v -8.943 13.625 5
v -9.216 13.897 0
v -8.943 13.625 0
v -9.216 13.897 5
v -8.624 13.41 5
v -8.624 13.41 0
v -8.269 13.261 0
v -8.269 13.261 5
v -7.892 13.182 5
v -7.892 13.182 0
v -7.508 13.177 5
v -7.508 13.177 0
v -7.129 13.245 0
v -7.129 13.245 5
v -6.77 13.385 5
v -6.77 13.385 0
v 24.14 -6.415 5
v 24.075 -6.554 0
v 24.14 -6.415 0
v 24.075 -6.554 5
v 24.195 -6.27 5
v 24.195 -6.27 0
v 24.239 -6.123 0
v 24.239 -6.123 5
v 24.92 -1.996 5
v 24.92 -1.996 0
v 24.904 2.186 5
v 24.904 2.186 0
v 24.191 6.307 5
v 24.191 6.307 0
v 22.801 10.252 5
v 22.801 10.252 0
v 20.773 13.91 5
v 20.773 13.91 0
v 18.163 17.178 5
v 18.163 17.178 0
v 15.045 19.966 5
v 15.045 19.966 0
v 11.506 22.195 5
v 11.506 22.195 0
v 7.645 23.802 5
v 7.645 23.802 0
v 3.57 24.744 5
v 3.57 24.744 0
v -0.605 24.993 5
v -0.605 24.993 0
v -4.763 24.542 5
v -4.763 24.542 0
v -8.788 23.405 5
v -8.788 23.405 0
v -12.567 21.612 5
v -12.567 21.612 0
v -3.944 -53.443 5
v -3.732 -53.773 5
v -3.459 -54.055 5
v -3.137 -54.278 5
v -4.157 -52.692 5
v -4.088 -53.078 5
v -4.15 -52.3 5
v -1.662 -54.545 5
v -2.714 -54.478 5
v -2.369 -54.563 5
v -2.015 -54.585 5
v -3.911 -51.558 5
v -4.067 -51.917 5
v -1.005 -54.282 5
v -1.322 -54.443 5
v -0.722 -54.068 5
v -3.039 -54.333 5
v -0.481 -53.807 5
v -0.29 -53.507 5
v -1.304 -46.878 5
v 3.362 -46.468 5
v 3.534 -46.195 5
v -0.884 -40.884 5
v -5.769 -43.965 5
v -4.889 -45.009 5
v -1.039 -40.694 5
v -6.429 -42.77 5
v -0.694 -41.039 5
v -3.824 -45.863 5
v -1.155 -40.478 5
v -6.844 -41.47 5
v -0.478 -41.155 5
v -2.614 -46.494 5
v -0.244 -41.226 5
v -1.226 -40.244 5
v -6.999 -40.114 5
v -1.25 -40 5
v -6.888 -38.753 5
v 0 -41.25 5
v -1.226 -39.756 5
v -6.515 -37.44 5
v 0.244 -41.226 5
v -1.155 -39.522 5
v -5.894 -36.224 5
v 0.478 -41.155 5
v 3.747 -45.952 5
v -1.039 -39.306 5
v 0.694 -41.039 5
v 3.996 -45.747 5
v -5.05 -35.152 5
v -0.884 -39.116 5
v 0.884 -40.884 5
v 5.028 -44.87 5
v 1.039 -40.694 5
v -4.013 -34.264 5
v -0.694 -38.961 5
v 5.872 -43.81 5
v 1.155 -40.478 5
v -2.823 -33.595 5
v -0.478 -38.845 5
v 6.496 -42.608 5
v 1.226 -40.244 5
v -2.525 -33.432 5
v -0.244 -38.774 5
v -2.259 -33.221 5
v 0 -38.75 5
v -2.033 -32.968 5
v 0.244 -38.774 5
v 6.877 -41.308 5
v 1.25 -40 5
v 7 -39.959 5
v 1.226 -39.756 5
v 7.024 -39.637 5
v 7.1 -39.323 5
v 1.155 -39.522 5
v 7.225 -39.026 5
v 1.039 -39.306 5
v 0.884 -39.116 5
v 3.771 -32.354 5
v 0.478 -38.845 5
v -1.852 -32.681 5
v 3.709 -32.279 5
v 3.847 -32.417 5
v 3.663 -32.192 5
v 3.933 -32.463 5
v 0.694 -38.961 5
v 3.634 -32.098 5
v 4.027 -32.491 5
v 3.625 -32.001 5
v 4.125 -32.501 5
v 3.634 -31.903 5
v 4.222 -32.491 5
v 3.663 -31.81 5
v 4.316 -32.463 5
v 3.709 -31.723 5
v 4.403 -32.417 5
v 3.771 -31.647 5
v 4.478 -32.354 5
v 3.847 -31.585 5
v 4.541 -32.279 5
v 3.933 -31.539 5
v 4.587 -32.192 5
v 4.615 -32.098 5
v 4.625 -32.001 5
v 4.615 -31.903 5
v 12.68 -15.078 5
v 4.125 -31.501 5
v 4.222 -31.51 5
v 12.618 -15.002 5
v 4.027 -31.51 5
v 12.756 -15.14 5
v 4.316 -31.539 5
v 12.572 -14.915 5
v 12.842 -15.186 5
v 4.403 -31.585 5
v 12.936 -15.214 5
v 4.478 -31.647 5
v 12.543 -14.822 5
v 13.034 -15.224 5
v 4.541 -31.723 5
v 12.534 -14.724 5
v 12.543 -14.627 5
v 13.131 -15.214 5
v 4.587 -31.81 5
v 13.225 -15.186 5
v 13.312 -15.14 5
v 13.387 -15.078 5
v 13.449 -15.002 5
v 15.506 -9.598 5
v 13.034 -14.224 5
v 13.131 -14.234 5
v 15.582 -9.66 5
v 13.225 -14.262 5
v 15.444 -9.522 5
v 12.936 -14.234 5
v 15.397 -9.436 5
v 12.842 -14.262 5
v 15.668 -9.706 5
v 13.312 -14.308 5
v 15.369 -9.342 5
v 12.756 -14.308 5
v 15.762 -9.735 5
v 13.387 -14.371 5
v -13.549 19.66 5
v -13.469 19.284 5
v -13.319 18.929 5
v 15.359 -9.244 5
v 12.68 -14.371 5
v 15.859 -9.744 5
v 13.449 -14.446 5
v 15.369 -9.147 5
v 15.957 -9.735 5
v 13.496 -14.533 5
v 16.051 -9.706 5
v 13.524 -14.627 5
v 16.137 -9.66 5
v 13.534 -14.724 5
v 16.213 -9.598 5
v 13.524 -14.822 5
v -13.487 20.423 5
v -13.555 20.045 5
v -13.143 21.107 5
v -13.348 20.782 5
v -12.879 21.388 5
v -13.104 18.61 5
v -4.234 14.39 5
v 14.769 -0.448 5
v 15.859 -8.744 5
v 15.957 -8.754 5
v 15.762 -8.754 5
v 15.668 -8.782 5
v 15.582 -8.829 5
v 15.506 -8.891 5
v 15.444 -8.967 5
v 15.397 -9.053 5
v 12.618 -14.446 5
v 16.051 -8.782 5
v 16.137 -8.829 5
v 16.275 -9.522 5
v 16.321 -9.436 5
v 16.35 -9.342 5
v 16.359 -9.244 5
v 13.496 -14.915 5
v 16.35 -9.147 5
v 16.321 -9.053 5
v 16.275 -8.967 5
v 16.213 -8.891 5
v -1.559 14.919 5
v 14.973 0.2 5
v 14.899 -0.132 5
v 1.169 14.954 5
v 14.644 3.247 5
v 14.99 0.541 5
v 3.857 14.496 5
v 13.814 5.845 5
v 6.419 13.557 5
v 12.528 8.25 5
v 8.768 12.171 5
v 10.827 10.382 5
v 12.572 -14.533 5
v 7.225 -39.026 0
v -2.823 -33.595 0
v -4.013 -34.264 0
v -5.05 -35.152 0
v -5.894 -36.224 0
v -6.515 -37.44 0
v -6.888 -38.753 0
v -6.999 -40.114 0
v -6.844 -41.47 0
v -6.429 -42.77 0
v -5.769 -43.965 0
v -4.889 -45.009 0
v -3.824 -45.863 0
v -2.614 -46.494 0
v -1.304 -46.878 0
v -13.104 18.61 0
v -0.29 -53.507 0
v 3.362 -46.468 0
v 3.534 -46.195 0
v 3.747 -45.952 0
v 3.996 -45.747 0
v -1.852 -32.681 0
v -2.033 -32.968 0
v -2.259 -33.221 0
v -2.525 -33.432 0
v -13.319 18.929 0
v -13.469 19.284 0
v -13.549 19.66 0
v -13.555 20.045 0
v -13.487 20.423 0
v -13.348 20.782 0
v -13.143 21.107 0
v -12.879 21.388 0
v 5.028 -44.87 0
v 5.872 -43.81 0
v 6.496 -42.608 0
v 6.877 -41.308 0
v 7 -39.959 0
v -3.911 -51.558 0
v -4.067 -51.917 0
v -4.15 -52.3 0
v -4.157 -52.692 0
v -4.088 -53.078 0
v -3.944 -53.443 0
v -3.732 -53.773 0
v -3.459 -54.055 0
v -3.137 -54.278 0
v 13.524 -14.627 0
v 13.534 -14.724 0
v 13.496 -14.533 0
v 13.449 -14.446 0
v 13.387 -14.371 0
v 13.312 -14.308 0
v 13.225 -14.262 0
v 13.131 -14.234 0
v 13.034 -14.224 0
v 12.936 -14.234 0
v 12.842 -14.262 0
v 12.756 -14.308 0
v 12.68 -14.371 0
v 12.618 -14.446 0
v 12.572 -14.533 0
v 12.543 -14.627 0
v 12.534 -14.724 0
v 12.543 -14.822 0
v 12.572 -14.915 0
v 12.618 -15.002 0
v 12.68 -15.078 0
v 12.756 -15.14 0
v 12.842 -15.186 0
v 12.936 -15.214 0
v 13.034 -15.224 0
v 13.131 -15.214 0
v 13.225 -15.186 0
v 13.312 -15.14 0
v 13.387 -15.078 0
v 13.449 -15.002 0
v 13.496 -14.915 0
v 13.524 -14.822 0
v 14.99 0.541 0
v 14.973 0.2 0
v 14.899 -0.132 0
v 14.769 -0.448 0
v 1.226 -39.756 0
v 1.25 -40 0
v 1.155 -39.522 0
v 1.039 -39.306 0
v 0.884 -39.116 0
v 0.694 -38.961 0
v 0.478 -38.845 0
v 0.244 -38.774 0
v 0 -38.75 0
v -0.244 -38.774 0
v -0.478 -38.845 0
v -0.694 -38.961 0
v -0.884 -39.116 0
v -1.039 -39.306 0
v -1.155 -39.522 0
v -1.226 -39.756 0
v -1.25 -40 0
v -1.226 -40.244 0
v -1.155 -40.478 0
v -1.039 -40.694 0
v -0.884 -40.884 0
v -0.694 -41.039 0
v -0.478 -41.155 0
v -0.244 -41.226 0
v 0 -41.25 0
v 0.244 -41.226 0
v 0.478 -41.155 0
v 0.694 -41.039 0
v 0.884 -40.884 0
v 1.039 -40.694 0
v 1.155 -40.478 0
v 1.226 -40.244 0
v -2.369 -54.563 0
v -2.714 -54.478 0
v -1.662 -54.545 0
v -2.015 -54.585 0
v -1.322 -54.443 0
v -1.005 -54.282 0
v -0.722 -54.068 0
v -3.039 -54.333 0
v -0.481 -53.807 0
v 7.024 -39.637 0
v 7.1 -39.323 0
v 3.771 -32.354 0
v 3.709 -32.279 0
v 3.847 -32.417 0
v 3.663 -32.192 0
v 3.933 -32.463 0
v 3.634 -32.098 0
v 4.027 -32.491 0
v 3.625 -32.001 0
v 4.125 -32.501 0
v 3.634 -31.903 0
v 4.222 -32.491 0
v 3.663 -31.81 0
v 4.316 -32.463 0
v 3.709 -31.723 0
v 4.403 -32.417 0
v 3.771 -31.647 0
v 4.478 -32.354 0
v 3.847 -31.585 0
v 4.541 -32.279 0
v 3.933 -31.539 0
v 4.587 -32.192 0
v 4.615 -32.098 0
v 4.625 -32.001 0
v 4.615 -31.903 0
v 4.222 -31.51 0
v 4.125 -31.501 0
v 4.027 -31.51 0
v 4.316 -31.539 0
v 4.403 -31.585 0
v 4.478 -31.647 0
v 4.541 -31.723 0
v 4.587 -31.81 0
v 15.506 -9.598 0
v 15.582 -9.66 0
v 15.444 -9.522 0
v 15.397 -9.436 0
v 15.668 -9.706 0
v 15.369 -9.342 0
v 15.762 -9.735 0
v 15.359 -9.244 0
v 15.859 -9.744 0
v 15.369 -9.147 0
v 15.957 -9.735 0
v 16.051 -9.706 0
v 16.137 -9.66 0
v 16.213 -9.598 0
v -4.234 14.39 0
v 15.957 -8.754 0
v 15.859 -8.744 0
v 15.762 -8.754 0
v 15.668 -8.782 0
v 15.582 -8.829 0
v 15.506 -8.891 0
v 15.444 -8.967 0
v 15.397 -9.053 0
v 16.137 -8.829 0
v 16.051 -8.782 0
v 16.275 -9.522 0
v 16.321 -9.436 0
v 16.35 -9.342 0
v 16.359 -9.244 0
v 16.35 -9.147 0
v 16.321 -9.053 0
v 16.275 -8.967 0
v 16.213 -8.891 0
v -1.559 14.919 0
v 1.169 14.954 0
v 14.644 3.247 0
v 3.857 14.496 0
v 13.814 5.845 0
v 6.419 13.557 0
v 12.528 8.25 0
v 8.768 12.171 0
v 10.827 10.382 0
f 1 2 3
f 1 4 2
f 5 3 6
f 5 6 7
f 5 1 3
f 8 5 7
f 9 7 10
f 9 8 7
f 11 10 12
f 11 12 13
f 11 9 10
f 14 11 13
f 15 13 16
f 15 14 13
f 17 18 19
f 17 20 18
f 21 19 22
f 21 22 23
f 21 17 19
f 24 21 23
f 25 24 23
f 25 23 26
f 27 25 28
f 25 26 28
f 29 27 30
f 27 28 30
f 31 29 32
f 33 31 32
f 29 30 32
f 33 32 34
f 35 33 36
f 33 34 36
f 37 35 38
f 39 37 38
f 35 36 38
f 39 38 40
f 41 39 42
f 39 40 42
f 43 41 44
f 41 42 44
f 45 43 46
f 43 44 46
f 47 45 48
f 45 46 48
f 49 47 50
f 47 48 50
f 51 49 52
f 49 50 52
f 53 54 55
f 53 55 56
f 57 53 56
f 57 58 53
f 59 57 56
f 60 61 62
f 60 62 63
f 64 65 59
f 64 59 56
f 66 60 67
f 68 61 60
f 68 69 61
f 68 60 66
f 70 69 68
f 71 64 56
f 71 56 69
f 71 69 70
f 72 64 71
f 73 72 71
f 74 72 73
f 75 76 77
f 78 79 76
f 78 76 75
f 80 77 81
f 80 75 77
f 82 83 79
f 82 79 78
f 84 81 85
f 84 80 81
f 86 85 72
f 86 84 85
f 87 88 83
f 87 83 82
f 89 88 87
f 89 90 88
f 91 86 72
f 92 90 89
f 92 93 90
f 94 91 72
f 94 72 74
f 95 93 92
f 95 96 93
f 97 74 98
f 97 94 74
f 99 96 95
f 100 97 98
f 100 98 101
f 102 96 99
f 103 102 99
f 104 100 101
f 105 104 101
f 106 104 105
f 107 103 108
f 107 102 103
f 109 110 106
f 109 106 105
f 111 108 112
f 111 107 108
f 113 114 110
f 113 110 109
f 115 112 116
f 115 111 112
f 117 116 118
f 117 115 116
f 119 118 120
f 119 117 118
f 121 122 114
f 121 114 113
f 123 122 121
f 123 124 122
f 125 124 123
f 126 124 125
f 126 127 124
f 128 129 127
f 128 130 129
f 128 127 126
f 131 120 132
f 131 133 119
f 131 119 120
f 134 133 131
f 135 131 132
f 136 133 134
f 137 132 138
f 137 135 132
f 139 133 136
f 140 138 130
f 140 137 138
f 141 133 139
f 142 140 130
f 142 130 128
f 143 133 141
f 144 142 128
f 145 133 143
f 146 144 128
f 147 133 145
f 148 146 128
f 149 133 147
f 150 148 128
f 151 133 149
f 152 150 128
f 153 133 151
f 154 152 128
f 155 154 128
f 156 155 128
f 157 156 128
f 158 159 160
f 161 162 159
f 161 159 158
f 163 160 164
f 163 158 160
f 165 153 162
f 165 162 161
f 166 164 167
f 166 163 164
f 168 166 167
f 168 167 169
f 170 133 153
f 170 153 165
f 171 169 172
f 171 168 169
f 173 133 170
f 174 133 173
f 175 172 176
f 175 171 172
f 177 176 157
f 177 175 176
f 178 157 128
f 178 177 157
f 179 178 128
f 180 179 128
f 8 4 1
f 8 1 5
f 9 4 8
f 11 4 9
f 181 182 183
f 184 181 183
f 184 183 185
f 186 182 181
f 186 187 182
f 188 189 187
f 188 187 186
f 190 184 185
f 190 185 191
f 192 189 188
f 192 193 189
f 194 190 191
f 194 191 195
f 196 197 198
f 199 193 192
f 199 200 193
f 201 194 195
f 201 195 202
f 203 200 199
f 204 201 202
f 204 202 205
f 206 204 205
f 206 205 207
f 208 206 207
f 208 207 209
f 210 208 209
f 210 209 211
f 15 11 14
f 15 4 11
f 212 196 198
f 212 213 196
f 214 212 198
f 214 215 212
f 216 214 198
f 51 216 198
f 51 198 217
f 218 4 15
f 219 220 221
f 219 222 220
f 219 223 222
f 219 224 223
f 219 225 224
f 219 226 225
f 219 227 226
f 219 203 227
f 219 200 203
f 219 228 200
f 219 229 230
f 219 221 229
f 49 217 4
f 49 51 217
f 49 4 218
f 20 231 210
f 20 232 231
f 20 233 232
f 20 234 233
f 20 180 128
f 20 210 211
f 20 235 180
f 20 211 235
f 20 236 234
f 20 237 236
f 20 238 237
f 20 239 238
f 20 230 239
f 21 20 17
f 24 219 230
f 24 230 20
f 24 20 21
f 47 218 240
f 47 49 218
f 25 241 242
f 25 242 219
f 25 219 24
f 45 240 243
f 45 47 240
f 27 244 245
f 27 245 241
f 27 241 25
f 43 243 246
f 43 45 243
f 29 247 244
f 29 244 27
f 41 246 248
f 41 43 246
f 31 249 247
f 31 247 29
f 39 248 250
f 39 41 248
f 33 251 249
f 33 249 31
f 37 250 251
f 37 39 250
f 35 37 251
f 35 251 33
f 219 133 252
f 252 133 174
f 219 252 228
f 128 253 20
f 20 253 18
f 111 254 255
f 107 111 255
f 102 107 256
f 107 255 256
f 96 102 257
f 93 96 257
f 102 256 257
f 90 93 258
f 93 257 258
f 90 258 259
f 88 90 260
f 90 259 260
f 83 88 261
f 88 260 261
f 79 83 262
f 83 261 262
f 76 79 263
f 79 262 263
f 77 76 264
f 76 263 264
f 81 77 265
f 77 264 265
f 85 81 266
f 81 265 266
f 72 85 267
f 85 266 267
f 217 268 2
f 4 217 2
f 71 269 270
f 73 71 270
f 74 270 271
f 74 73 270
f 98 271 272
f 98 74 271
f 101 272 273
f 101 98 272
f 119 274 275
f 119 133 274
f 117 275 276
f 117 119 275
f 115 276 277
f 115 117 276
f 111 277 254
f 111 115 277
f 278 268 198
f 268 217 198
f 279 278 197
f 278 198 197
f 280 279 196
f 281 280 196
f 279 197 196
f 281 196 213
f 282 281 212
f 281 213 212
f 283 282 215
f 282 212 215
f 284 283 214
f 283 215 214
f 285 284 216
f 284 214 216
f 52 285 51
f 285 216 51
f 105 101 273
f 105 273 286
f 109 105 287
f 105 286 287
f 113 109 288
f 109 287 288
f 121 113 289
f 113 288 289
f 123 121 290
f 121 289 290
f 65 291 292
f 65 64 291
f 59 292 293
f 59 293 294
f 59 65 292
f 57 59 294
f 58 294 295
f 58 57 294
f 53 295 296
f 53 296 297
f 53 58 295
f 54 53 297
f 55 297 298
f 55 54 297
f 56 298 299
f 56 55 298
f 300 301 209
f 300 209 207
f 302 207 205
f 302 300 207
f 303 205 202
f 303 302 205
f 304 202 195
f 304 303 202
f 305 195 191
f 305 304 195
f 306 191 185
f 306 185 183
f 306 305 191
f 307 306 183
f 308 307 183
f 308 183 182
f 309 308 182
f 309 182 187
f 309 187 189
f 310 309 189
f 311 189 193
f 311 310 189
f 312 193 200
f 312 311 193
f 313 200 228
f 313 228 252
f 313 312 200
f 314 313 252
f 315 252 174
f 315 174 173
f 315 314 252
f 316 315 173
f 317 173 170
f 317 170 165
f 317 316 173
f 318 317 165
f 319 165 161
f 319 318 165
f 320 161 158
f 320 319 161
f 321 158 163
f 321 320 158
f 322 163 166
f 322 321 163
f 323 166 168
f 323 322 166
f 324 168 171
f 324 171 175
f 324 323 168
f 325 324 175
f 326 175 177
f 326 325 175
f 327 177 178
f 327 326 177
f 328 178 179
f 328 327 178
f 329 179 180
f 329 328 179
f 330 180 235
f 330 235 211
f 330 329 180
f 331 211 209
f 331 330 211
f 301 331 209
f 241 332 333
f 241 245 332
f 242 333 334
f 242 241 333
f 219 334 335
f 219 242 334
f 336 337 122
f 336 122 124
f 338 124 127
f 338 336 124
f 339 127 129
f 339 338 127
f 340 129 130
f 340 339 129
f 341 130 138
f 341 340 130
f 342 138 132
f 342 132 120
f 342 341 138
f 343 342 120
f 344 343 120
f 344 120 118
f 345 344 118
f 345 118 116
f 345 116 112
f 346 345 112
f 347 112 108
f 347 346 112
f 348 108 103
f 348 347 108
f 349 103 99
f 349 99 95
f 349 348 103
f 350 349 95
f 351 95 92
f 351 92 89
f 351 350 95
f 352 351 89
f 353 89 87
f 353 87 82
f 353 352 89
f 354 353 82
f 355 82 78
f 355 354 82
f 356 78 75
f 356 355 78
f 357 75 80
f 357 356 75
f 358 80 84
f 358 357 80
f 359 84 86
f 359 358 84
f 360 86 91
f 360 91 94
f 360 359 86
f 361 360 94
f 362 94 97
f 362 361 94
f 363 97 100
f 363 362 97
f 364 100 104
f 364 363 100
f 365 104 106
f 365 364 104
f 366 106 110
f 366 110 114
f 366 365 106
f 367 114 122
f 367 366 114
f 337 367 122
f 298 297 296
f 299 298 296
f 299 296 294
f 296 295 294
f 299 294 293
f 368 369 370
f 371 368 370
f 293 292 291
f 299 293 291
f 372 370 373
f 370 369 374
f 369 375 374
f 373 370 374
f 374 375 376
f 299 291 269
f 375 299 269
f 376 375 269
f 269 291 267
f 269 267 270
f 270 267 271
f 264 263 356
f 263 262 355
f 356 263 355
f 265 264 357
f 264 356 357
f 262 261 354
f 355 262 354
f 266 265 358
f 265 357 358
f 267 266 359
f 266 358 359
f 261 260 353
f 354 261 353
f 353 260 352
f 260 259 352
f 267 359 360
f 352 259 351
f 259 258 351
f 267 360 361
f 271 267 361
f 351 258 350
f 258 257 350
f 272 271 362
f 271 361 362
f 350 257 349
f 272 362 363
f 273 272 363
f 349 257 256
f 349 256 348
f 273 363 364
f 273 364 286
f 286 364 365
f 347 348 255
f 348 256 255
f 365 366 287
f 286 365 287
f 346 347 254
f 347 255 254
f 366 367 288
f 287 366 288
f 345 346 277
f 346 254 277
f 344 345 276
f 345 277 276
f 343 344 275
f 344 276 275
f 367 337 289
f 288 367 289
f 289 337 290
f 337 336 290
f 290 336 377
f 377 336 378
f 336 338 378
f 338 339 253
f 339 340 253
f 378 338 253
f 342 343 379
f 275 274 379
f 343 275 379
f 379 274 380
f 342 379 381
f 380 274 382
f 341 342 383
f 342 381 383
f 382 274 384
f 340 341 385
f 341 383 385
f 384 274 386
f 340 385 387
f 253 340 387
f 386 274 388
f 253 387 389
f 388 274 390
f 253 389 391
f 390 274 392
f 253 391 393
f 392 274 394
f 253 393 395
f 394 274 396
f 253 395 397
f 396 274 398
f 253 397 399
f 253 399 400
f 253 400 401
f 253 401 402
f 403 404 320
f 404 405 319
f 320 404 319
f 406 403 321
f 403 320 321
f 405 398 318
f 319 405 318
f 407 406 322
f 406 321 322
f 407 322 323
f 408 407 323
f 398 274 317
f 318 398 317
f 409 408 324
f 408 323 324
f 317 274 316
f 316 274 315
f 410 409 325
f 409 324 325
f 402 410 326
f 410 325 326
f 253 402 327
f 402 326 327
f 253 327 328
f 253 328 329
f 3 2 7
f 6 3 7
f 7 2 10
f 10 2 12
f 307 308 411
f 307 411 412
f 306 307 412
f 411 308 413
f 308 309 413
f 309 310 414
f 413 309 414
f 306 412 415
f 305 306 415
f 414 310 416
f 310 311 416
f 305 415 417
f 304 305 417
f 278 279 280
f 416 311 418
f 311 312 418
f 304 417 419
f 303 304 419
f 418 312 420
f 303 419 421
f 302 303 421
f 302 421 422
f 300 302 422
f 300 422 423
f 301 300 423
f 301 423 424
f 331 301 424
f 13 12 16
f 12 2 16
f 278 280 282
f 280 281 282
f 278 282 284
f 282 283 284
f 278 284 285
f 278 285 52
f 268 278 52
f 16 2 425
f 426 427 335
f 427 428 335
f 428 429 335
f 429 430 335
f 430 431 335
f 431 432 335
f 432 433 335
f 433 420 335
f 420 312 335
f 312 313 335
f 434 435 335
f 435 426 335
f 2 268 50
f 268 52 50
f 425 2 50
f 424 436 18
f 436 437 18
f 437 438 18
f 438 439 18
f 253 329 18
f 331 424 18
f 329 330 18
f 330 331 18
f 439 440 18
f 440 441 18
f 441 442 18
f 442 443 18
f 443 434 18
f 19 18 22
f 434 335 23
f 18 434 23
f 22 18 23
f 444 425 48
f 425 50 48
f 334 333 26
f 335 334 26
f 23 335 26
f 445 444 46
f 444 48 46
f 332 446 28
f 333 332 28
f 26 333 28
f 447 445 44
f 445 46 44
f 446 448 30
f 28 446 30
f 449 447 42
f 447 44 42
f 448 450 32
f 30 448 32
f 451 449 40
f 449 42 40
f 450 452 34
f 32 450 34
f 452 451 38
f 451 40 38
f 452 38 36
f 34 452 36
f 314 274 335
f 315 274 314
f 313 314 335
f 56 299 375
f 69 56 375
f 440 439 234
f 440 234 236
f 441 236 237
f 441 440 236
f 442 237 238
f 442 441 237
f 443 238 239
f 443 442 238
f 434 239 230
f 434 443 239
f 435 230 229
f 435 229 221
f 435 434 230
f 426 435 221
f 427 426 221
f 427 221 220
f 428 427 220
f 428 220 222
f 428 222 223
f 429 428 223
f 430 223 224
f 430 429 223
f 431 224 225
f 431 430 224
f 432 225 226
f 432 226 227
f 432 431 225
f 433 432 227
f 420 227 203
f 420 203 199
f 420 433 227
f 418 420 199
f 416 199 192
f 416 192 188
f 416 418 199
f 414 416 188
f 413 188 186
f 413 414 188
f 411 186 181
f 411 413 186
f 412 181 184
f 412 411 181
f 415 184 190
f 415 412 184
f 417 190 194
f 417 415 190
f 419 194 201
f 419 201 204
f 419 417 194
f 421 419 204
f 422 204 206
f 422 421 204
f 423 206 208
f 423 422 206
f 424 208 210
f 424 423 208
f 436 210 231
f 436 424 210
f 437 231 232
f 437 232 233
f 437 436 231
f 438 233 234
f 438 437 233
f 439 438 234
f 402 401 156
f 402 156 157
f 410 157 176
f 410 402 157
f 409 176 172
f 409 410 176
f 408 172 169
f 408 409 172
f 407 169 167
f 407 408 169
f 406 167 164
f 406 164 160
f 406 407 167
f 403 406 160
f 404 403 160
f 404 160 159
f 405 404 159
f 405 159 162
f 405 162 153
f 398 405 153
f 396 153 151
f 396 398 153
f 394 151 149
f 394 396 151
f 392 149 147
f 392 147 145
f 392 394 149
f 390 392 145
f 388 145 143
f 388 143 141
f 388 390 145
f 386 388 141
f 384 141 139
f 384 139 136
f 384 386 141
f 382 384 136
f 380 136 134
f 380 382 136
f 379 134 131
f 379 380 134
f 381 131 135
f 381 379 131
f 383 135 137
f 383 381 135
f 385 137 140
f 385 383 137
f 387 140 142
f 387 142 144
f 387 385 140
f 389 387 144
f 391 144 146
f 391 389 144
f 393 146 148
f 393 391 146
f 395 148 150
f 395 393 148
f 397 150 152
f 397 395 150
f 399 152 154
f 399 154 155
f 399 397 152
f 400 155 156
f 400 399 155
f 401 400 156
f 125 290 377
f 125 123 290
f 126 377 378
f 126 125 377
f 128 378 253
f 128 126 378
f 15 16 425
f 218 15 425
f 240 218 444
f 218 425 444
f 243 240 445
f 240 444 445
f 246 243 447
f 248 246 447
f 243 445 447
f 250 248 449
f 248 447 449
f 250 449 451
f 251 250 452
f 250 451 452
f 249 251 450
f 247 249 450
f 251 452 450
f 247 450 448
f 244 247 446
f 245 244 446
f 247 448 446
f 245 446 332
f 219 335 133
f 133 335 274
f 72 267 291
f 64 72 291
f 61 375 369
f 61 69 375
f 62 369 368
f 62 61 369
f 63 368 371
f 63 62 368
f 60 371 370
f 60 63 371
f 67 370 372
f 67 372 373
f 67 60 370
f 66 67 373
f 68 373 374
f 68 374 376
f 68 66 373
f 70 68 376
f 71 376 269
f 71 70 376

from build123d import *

# Parameters (mm, degrees)
F0_R     = 1.25
F0_R_2   = 0.5
F1_DEPTH = 5
F2_R     = 2


# Not quite as in the source:
# - two fillets or chamfers of one size are made in one step
# - a feature names something its author has since deleted; it is built from what else it names


with BuildPart() as f1:
    # F0 (on Top) → F1 (new body)
    with BuildSketch(Plane.XY):
        with BuildLine():
            Line((-14.5326076762, 20.3421560836), (-8.1431852604, 12.5971637211))
            ThreePointArc((-8.1431852604, 12.5971637211), (7.1712000772, 13.174744379), (15, 0))
            Line((15, 0), (-2.1995428838, -33.3545495937))
            ThreePointArc((-2.1995428838, -33.3545495937), (-6.9846930225, -40.4626698406), (-1.3037745428, -46.8775120459))
            ThreePointArc((-1.3037745428, -46.8775120459), (1.2316251761, -46.8907981704), (3.6054450158, -46.0000638528))
            Line((3.6054450158, -46.0000638528), (6.9816735201, -39.4938035379))
            Line((6.9816735201, -39.4938035379), (24.1795416276, -6.3521466198))
            ThreePointArc((24.1795416276, -6.3521466198), (14.1919795262, 20.5812467341), (-14.5326076762, 20.3421560836))
        make_face()
        with Locations((0, -40)):
            Circle(F0_R, mode=Mode.SUBTRACT)
        with Locations((4.1248112098, -32.0008792681)):
            Circle(F0_R_2, mode=Mode.SUBTRACT)
        with Locations((13.0337394799, -14.7240660517)):
            Circle(F0_R_2, mode=Mode.SUBTRACT)
        with Locations((15.8593580654, -9.2444300009)):
            Circle(F0_R_2, mode=Mode.SUBTRACT)
        with BuildLine():
            ThreePointArc((3.6054450158, -46.0000638528), (1.2316251761, -46.8907981704), (-1.3037745428, -46.8775120459))
            Line((-1.3037745428, -46.8775120459), (-4.8843406974, -53.3048406851))
            Line((-4.8843406974, -53.3048406851), (-1.2389638203, -55.3356242034))
            Line((-1.2389638203, -55.3356242034), (3.6054450158, -46.0000638528))
        make_face()
        with BuildLine():
            ThreePointArc((3.6054450158, -46.0000638528), (6.2132620695, -43.2241858593), (6.9816735201, -39.4938035379))
            Line((6.9816735201, -39.4938035379), (3.6054450158, -46.0000638528))
        make_face()
    extrude(amount=F1_DEPTH)

    # F2
    f2_edges = [f1.edges().sort_by_distance(p)[0] for p in [
        (6.981674, -39.493804, 2.5),
        (15, 0, 2.5),
        (-8.143185, 12.597164, 2.5),
        (-14.532608, 20.342156, 2.5),
        (24.179542, -6.352147, 2.5),
        (-2.199543, -33.35455, 2.5),
        (-4.884341, -53.304841, 2.5),
        (-1.238964, -55.335624, 2.5),
        (3.605445, -46.000064, 2.5),
    ]]
    fillet(f2_edges, radius=F2_R)


solid = f1.part
